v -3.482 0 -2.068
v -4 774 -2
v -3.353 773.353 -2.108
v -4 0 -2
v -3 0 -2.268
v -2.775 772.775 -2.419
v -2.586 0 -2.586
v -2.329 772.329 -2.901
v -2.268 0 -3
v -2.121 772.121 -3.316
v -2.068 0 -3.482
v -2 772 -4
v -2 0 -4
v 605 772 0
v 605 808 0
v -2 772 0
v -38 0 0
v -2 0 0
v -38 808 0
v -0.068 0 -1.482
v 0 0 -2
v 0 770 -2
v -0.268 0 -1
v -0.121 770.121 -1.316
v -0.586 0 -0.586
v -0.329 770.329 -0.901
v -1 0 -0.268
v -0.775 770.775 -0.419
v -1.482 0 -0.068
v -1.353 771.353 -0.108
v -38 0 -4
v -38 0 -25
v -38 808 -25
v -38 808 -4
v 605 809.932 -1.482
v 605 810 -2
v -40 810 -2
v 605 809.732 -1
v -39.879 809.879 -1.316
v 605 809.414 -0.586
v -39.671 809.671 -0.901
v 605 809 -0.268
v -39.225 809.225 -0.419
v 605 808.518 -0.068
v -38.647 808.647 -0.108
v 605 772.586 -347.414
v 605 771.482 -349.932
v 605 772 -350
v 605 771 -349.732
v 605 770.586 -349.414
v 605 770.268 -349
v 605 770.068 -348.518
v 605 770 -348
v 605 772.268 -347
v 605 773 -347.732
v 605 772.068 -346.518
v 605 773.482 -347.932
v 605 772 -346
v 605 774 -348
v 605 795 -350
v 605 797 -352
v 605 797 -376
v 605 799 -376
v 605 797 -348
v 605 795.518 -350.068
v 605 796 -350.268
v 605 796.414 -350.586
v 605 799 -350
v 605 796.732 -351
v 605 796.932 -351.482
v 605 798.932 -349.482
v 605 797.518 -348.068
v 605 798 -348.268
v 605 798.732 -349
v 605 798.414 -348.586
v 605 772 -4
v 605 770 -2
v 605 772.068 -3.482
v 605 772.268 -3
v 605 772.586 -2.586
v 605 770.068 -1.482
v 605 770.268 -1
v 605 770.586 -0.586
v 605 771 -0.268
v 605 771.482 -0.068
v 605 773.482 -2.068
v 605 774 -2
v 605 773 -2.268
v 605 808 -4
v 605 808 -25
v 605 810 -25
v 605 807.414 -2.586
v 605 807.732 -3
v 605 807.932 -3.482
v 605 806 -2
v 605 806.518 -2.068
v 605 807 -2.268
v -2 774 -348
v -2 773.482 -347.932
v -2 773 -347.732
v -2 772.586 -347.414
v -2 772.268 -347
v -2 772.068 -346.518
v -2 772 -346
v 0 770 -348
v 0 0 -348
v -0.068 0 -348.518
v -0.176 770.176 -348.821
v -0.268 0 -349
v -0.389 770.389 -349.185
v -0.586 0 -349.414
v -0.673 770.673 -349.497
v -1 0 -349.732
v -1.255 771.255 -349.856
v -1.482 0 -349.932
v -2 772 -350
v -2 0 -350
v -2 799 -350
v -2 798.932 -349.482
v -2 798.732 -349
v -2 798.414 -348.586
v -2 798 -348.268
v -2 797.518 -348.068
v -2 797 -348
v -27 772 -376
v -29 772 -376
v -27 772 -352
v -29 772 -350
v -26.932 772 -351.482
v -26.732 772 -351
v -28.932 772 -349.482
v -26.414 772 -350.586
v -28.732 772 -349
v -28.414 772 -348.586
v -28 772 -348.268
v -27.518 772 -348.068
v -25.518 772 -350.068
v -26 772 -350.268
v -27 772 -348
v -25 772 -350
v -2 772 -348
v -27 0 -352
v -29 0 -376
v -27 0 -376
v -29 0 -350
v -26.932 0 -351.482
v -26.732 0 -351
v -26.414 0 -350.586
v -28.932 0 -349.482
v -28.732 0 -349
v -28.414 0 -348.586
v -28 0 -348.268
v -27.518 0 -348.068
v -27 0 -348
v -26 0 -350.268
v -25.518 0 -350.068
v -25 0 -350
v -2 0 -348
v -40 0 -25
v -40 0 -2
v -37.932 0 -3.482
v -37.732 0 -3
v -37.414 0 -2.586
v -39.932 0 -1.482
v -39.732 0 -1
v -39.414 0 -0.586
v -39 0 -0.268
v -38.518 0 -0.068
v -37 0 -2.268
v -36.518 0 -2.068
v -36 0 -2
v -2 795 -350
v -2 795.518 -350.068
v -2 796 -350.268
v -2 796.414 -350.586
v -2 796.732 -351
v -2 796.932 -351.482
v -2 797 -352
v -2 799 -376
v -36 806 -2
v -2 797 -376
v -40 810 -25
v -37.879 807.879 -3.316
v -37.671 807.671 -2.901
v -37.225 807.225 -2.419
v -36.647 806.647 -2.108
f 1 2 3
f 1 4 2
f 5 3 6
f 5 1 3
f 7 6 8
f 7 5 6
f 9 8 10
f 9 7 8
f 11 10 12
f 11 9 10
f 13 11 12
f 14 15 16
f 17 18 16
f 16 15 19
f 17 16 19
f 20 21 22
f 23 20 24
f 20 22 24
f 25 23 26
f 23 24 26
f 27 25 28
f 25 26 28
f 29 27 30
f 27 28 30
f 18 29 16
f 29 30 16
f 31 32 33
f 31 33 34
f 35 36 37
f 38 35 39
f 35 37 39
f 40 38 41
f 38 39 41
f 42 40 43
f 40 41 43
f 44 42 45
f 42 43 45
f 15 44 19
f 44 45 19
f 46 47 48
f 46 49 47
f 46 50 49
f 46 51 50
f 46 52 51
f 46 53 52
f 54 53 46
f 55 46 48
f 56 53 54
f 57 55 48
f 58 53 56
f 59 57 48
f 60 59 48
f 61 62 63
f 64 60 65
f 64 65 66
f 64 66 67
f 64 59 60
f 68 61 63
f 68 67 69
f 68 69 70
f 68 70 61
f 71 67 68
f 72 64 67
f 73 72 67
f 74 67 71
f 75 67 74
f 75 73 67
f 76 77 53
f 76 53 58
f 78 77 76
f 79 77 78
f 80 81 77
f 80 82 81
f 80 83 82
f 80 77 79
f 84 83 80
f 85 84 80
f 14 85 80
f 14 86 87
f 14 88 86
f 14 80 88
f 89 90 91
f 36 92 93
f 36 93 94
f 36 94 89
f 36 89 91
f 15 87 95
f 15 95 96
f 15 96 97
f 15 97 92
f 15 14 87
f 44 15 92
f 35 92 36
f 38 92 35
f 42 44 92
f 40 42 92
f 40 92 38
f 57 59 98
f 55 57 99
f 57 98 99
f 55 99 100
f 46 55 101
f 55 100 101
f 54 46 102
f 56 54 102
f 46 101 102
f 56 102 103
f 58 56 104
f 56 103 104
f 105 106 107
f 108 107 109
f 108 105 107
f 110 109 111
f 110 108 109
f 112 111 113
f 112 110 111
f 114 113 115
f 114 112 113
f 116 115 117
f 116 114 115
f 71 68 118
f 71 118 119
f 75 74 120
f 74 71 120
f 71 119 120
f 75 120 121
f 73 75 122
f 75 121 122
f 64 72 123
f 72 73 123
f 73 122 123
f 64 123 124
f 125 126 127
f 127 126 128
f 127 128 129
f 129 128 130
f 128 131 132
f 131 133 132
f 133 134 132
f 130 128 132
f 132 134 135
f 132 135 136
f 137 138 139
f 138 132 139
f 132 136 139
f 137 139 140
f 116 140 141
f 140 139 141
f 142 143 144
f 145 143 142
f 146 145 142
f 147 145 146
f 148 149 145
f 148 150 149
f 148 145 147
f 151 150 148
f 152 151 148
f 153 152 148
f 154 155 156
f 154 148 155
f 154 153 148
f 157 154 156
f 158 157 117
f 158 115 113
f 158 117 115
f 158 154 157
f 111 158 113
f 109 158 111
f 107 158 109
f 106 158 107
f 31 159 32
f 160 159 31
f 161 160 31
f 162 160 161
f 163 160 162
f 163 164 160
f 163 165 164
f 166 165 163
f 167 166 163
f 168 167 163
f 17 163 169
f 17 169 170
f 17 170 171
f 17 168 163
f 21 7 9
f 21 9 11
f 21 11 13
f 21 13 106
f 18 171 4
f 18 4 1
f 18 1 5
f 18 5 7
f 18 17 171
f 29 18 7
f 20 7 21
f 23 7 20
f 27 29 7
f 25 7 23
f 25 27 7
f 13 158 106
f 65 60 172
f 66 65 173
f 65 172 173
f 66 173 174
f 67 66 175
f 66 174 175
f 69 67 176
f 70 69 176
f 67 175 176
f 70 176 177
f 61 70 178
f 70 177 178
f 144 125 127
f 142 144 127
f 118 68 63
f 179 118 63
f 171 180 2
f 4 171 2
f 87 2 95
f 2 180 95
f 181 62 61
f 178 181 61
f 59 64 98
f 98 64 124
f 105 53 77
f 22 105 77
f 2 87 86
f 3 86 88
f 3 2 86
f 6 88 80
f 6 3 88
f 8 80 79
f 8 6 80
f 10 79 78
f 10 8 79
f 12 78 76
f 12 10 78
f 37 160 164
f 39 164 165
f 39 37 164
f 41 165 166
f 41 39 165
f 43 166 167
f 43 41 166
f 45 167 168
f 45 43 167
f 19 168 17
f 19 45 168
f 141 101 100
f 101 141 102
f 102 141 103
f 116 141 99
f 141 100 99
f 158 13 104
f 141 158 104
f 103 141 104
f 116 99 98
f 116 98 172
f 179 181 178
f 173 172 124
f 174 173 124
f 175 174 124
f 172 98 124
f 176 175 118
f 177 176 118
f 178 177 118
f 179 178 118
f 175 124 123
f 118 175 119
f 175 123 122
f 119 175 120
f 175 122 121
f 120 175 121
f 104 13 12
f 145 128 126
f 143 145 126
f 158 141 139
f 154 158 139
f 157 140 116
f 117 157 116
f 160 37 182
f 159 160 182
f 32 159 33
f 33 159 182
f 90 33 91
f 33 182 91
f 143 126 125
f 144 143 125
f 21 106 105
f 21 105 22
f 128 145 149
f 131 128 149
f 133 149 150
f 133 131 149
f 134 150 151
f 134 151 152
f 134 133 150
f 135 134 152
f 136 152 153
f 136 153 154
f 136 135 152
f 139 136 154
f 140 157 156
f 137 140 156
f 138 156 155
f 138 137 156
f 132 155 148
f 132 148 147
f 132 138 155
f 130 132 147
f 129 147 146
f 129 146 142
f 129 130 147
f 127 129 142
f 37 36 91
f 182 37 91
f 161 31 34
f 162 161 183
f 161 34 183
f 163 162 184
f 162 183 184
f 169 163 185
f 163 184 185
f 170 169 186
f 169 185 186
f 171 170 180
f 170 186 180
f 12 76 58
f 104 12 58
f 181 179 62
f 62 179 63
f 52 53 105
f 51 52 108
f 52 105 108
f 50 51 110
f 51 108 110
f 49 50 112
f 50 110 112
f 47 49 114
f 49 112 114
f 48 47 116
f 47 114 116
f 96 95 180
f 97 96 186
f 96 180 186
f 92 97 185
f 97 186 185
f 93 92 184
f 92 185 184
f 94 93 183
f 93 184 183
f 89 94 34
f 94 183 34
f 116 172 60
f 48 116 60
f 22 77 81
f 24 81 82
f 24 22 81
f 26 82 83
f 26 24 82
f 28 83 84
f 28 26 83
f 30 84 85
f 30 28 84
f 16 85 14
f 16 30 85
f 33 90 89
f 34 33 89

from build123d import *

# Parameters (mm, degrees)
F3_W         = 27
F3_H         = 27
F4_DEPTH     = 30
F5_T1_DEPTH  = 607
F5_T3_DEPTH  = 772
F5_T5_DEPTH  = 808
F5_T7_DEPTH  = 643
F5_T13_DEPTH = 777
F5_T17_DEPTH = 612
F5_T20_DEPTH = 617
F5_T22_DEPTH = 782
F5_T24_DEPTH = 820
F5_T26_DEPTH = 775
F5_T28_DEPTH = 610
F5_T30_DEPTH = 655
F5_T36_DEPTH = 780
F5_T40_DEPTH = 615
F5_T47_DEPTH = 780
F5_T51_DEPTH = 615


# Not quite as in the source:
# - a fillet or chamfer that OpenCascade refuses, or shapes differently, is made with other operations: its cross-section is extruded or revolved along the edge and cut away or added


with BuildPart() as f2:
    # F2: sweep along a path in F1
    with BuildLine(Plane.XY) as f2_path:
        Line((0, 0), (0, 770))
        Line((0, 770), (605, 770))
    # F0 (on Front) → F2 (sweep)
    with BuildSketch(Plane.XZ):
        Polygon((0, -350), (0, 0), (-40, 0), (-40, -25), (-38, -25), (-38, -2), (-2, -2), (-2, -348), (-29, -348), (-29, -376), (-27, -376), (-27, -350), align=None)
    sweep(path=f2_path.line, transition=Transition.RIGHT)

    # F3 (on face) → F4 (cut)
    with BuildSketch(Plane.XY.offset(-348)):
        with Locations((-15.5, 785.5)):
            Rectangle(F3_W, F3_H)
    extrude(amount=-F4_DEPTH, mode=Mode.SUBTRACT)

    # F5: fillet of radius 2 on 15 edges, made by hand

    # F5_s2 → F5_t1 (join)
    with BuildSketch(Plane.YZ.offset(-2)):
        with BuildLine():
            ThreePointArc((774, -348), (772.5857864376, -347.4142135624), (772, -346))
            Line((772, -346), (772, -348))
            Line((772, -348), (774, -348))
        make_face()
        with BuildLine():
            ThreePointArc((774, -2), (772.5857864376, -2.5857864376), (772, -4))
            Line((772, -4), (772, -2))
            Line((772, -2), (774, -2))
        make_face()
        with BuildLine():
            ThreePointArc((795, -350), (796.4142135624, -350.5857864376), (797, -352))
            Line((797, -352), (797, -350))
            Line((797, -350), (795, -350))
        make_face()
    extrude(amount=F5_T1_DEPTH)

    # F5_s4 → F5_t3 (join)
    with BuildSketch(Plane.XZ.offset(-772)):
        with BuildLine():
            ThreePointArc((-4, -2), (-2.5857864376, -2.5857864376), (-2, -4))
            Line((-2, -4), (-2, -2))
            Line((-2, -2), (-4, -2))
        make_face()
        with BuildLine():
            ThreePointArc((-25, -350), (-26.4142135624, -350.5857864376), (-27, -352))
            Line((-27, -352), (-27, -350))
            Line((-27, -350), (-25, -350))
        make_face()
    extrude(amount=F5_T3_DEPTH)

    # F5_s6 → F5_t5 (join)
    with BuildSketch(Plane.XZ.offset(-808)):
        with BuildLine():
            ThreePointArc((-38, -4), (-37.4142135624, -2.5857864376), (-36, -2))
            Line((-36, -2), (-38, -2))
            Line((-38, -2), (-38, -4))
        make_face()
    extrude(amount=F5_T5_DEPTH)

    # F5_s8 → F5_t7 (join)
    with BuildSketch(Plane.YZ.offset(-38)):
        with BuildLine():
            ThreePointArc((806, -2), (807.4142135624, -2.5857864376), (808, -4))
            Line((808, -4), (808, -2))
            Line((808, -2), (806, -2))
        make_face()
    extrude(amount=F5_T7_DEPTH)


with BuildPart() as f5_tool11:
    # F5_s12 → F5_t13 (new body)
    with BuildSketch(Plane.XZ):
        with BuildLine():
            ThreePointArc((-4, -2), (-2.5857864376, -2.5857864376), (-2, -4))
            Line((-2, -4), (-2, -2))
            Line((-2, -2), (-4, -2))
        make_face()
    extrude(amount=-F5_T13_DEPTH)

    split(bisect_by=Plane.XZ.offset(-772), keep=Keep.BOTTOM)


with BuildPart() as f5_tool15:
    # F5_s16 → F5_t17 (new body)
    with BuildSketch(Plane.YZ.offset(-7)):
        with BuildLine():
            ThreePointArc((774, -2), (772.5857864376, -2.5857864376), (772, -4))
            Line((772, -4), (772, -2))
            Line((772, -2), (774, -2))
        make_face()
    extrude(amount=F5_T17_DEPTH)

    split(bisect_by=Plane.YZ.offset(-2), keep=Keep.BOTTOM)


with BuildPart() as f5_tool11_1:
    add(f5_tool11.part)

    # F5_t19: intersect F5_tool15
    add(f5_tool15.part, mode=Mode.INTERSECT)


with BuildPart() as f2_1:
    add(f2.part)

    # F5_t9: union F5_tool11
    add(f5_tool11_1.part)

    # F5_s21 → F5_t20 (cut)
    with BuildSketch(Plane.YZ.offset(-7)):
        with BuildLine():
            ThreePointArc((799, -350), (798.4142135624, -348.5857864376), (797, -348))
            Line((797, -348), (799, -348))
            Line((799, -348), (799, -350))
        make_face()
    extrude(amount=F5_T20_DEPTH, mode=Mode.SUBTRACT)

    # F5_s23 → F5_t22 (cut)
    with BuildSketch(Plane.XZ.offset(-777)):
        with BuildLine():
            ThreePointArc((-29, -350), (-28.4142135624, -348.5857864376), (-27, -348))
            Line((-27, -348), (-29, -348))
            Line((-29, -348), (-29, -350))
        make_face()
    extrude(amount=F5_T22_DEPTH, mode=Mode.SUBTRACT)

    # F5_s25 → F5_t24 (cut)
    with BuildSketch(Plane.XZ.offset(-815)):
        with BuildLine():
            ThreePointArc((-40, -2), (-39.4142135624, -0.5857864376), (-38, 0))
            Line((-38, 0), (-40, 0))
            Line((-40, 0), (-40, -2))
        make_face()
    extrude(amount=F5_T24_DEPTH, mode=Mode.SUBTRACT)

    # F5_s27 → F5_t26 (cut)
    with BuildSketch(Plane.XZ.offset(-770)):
        with BuildLine():
            ThreePointArc((0, -2), (-0.5857864376, -0.5857864376), (-2, 0))
            Line((-2, 0), (0, 0))
            Line((0, 0), (0, -2))
        make_face()
        with BuildLine():
            ThreePointArc((0, -348), (-0.5857864376, -349.4142135624), (-2, -350))
            Line((-2, -350), (0, -350))
            Line((0, -350), (0, -348))
        make_face()
    extrude(amount=F5_T26_DEPTH, mode=Mode.SUBTRACT)

    # F5_s29 → F5_t28 (cut)
    with BuildSketch(Plane.YZ):
        with BuildLine():
            ThreePointArc((770, -2), (770.5857864376, -0.5857864376), (772, 0))
            Line((772, 0), (770, 0))
            Line((770, 0), (770, -2))
        make_face()
        with BuildLine():
            ThreePointArc((770, -348), (770.5857864376, -349.4142135624), (772, -350))
            Line((772, -350), (770, -350))
            Line((770, -350), (770, -348))
        make_face()
    extrude(amount=F5_T28_DEPTH, mode=Mode.SUBTRACT)

    # F5_s31 → F5_t30 (cut)
    with BuildSketch(Plane.YZ.offset(-45)):
        with BuildLine():
            ThreePointArc((810, -2), (809.4142135624, -0.5857864376), (808, 0))
            Line((808, 0), (810, 0))
            Line((810, 0), (810, -2))
        make_face()
    extrude(amount=F5_T30_DEPTH, mode=Mode.SUBTRACT)


with BuildPart() as f5_tool34:
    # F5_s35 → F5_t36 (new body)
    with BuildSketch(Plane.XZ.offset(5)):
        with BuildLine():
            ThreePointArc((0, -2), (-0.5857864376, -0.5857864376), (-2, 0))
            Line((-2, 0), (0, 0))
            Line((0, 0), (0, -2))
        make_face()
    extrude(amount=-F5_T36_DEPTH)

    split(bisect_by=Plane.XZ.offset(-770), keep=Keep.BOTTOM)


with BuildPart() as f5_tool38:
    # F5_s39 → F5_t40 (new body)
    with BuildSketch(Plane.YZ.offset(-5)):
        with BuildLine():
            ThreePointArc((770, -2), (770.5857864376, -0.5857864376), (772, 0))
            Line((772, 0), (770, 0))
            Line((770, 0), (770, -2))
        make_face()
    extrude(amount=F5_T40_DEPTH)

    split(bisect_by=Plane.YZ, keep=Keep.BOTTOM)


with BuildPart() as f5_tool34_1:
    add(f5_tool34.part)

    # F5_t42: intersect F5_tool38
    add(f5_tool38.part, mode=Mode.INTERSECT)


with BuildPart() as f2_2:
    add(f2_1.part)

    # F5_t32: cut F5_tool34
    add(f5_tool34_1.part, mode=Mode.SUBTRACT)


with BuildPart() as f5_tool45:
    # F5_s46 → F5_t47 (new body)
    with BuildSketch(Plane.XZ.offset(5)):
        with BuildLine():
            ThreePointArc((0, -348), (-0.5857864376, -349.4142135624), (-2, -350))
            Line((-2, -350), (0, -350))
            Line((0, -350), (0, -348))
        make_face()
    extrude(amount=-F5_T47_DEPTH)

    split(bisect_by=Plane.XZ.offset(-770), keep=Keep.BOTTOM)


with BuildPart() as f5_tool49:
    # F5_s50 → F5_t51 (new body)
    with BuildSketch(Plane.YZ.offset(-5)):
        with BuildLine():
            ThreePointArc((770, -348), (770.5857864376, -349.4142135624), (772, -350))
            Line((772, -350), (770, -350))
            Line((770, -350), (770, -348))
        make_face()
    extrude(amount=F5_T51_DEPTH)

    split(bisect_by=Plane.YZ, keep=Keep.BOTTOM)


with BuildPart() as f5_tool45_1:
    add(f5_tool45.part)

    # F5_t53: intersect F5_tool49
    add(f5_tool49.part, mode=Mode.INTERSECT)


with BuildPart() as f2_3:
    add(f2_2.part)

    # F5_t43: cut F5_tool45
    add(f5_tool45_1.part, mode=Mode.SUBTRACT)


solid = f2_3.part
